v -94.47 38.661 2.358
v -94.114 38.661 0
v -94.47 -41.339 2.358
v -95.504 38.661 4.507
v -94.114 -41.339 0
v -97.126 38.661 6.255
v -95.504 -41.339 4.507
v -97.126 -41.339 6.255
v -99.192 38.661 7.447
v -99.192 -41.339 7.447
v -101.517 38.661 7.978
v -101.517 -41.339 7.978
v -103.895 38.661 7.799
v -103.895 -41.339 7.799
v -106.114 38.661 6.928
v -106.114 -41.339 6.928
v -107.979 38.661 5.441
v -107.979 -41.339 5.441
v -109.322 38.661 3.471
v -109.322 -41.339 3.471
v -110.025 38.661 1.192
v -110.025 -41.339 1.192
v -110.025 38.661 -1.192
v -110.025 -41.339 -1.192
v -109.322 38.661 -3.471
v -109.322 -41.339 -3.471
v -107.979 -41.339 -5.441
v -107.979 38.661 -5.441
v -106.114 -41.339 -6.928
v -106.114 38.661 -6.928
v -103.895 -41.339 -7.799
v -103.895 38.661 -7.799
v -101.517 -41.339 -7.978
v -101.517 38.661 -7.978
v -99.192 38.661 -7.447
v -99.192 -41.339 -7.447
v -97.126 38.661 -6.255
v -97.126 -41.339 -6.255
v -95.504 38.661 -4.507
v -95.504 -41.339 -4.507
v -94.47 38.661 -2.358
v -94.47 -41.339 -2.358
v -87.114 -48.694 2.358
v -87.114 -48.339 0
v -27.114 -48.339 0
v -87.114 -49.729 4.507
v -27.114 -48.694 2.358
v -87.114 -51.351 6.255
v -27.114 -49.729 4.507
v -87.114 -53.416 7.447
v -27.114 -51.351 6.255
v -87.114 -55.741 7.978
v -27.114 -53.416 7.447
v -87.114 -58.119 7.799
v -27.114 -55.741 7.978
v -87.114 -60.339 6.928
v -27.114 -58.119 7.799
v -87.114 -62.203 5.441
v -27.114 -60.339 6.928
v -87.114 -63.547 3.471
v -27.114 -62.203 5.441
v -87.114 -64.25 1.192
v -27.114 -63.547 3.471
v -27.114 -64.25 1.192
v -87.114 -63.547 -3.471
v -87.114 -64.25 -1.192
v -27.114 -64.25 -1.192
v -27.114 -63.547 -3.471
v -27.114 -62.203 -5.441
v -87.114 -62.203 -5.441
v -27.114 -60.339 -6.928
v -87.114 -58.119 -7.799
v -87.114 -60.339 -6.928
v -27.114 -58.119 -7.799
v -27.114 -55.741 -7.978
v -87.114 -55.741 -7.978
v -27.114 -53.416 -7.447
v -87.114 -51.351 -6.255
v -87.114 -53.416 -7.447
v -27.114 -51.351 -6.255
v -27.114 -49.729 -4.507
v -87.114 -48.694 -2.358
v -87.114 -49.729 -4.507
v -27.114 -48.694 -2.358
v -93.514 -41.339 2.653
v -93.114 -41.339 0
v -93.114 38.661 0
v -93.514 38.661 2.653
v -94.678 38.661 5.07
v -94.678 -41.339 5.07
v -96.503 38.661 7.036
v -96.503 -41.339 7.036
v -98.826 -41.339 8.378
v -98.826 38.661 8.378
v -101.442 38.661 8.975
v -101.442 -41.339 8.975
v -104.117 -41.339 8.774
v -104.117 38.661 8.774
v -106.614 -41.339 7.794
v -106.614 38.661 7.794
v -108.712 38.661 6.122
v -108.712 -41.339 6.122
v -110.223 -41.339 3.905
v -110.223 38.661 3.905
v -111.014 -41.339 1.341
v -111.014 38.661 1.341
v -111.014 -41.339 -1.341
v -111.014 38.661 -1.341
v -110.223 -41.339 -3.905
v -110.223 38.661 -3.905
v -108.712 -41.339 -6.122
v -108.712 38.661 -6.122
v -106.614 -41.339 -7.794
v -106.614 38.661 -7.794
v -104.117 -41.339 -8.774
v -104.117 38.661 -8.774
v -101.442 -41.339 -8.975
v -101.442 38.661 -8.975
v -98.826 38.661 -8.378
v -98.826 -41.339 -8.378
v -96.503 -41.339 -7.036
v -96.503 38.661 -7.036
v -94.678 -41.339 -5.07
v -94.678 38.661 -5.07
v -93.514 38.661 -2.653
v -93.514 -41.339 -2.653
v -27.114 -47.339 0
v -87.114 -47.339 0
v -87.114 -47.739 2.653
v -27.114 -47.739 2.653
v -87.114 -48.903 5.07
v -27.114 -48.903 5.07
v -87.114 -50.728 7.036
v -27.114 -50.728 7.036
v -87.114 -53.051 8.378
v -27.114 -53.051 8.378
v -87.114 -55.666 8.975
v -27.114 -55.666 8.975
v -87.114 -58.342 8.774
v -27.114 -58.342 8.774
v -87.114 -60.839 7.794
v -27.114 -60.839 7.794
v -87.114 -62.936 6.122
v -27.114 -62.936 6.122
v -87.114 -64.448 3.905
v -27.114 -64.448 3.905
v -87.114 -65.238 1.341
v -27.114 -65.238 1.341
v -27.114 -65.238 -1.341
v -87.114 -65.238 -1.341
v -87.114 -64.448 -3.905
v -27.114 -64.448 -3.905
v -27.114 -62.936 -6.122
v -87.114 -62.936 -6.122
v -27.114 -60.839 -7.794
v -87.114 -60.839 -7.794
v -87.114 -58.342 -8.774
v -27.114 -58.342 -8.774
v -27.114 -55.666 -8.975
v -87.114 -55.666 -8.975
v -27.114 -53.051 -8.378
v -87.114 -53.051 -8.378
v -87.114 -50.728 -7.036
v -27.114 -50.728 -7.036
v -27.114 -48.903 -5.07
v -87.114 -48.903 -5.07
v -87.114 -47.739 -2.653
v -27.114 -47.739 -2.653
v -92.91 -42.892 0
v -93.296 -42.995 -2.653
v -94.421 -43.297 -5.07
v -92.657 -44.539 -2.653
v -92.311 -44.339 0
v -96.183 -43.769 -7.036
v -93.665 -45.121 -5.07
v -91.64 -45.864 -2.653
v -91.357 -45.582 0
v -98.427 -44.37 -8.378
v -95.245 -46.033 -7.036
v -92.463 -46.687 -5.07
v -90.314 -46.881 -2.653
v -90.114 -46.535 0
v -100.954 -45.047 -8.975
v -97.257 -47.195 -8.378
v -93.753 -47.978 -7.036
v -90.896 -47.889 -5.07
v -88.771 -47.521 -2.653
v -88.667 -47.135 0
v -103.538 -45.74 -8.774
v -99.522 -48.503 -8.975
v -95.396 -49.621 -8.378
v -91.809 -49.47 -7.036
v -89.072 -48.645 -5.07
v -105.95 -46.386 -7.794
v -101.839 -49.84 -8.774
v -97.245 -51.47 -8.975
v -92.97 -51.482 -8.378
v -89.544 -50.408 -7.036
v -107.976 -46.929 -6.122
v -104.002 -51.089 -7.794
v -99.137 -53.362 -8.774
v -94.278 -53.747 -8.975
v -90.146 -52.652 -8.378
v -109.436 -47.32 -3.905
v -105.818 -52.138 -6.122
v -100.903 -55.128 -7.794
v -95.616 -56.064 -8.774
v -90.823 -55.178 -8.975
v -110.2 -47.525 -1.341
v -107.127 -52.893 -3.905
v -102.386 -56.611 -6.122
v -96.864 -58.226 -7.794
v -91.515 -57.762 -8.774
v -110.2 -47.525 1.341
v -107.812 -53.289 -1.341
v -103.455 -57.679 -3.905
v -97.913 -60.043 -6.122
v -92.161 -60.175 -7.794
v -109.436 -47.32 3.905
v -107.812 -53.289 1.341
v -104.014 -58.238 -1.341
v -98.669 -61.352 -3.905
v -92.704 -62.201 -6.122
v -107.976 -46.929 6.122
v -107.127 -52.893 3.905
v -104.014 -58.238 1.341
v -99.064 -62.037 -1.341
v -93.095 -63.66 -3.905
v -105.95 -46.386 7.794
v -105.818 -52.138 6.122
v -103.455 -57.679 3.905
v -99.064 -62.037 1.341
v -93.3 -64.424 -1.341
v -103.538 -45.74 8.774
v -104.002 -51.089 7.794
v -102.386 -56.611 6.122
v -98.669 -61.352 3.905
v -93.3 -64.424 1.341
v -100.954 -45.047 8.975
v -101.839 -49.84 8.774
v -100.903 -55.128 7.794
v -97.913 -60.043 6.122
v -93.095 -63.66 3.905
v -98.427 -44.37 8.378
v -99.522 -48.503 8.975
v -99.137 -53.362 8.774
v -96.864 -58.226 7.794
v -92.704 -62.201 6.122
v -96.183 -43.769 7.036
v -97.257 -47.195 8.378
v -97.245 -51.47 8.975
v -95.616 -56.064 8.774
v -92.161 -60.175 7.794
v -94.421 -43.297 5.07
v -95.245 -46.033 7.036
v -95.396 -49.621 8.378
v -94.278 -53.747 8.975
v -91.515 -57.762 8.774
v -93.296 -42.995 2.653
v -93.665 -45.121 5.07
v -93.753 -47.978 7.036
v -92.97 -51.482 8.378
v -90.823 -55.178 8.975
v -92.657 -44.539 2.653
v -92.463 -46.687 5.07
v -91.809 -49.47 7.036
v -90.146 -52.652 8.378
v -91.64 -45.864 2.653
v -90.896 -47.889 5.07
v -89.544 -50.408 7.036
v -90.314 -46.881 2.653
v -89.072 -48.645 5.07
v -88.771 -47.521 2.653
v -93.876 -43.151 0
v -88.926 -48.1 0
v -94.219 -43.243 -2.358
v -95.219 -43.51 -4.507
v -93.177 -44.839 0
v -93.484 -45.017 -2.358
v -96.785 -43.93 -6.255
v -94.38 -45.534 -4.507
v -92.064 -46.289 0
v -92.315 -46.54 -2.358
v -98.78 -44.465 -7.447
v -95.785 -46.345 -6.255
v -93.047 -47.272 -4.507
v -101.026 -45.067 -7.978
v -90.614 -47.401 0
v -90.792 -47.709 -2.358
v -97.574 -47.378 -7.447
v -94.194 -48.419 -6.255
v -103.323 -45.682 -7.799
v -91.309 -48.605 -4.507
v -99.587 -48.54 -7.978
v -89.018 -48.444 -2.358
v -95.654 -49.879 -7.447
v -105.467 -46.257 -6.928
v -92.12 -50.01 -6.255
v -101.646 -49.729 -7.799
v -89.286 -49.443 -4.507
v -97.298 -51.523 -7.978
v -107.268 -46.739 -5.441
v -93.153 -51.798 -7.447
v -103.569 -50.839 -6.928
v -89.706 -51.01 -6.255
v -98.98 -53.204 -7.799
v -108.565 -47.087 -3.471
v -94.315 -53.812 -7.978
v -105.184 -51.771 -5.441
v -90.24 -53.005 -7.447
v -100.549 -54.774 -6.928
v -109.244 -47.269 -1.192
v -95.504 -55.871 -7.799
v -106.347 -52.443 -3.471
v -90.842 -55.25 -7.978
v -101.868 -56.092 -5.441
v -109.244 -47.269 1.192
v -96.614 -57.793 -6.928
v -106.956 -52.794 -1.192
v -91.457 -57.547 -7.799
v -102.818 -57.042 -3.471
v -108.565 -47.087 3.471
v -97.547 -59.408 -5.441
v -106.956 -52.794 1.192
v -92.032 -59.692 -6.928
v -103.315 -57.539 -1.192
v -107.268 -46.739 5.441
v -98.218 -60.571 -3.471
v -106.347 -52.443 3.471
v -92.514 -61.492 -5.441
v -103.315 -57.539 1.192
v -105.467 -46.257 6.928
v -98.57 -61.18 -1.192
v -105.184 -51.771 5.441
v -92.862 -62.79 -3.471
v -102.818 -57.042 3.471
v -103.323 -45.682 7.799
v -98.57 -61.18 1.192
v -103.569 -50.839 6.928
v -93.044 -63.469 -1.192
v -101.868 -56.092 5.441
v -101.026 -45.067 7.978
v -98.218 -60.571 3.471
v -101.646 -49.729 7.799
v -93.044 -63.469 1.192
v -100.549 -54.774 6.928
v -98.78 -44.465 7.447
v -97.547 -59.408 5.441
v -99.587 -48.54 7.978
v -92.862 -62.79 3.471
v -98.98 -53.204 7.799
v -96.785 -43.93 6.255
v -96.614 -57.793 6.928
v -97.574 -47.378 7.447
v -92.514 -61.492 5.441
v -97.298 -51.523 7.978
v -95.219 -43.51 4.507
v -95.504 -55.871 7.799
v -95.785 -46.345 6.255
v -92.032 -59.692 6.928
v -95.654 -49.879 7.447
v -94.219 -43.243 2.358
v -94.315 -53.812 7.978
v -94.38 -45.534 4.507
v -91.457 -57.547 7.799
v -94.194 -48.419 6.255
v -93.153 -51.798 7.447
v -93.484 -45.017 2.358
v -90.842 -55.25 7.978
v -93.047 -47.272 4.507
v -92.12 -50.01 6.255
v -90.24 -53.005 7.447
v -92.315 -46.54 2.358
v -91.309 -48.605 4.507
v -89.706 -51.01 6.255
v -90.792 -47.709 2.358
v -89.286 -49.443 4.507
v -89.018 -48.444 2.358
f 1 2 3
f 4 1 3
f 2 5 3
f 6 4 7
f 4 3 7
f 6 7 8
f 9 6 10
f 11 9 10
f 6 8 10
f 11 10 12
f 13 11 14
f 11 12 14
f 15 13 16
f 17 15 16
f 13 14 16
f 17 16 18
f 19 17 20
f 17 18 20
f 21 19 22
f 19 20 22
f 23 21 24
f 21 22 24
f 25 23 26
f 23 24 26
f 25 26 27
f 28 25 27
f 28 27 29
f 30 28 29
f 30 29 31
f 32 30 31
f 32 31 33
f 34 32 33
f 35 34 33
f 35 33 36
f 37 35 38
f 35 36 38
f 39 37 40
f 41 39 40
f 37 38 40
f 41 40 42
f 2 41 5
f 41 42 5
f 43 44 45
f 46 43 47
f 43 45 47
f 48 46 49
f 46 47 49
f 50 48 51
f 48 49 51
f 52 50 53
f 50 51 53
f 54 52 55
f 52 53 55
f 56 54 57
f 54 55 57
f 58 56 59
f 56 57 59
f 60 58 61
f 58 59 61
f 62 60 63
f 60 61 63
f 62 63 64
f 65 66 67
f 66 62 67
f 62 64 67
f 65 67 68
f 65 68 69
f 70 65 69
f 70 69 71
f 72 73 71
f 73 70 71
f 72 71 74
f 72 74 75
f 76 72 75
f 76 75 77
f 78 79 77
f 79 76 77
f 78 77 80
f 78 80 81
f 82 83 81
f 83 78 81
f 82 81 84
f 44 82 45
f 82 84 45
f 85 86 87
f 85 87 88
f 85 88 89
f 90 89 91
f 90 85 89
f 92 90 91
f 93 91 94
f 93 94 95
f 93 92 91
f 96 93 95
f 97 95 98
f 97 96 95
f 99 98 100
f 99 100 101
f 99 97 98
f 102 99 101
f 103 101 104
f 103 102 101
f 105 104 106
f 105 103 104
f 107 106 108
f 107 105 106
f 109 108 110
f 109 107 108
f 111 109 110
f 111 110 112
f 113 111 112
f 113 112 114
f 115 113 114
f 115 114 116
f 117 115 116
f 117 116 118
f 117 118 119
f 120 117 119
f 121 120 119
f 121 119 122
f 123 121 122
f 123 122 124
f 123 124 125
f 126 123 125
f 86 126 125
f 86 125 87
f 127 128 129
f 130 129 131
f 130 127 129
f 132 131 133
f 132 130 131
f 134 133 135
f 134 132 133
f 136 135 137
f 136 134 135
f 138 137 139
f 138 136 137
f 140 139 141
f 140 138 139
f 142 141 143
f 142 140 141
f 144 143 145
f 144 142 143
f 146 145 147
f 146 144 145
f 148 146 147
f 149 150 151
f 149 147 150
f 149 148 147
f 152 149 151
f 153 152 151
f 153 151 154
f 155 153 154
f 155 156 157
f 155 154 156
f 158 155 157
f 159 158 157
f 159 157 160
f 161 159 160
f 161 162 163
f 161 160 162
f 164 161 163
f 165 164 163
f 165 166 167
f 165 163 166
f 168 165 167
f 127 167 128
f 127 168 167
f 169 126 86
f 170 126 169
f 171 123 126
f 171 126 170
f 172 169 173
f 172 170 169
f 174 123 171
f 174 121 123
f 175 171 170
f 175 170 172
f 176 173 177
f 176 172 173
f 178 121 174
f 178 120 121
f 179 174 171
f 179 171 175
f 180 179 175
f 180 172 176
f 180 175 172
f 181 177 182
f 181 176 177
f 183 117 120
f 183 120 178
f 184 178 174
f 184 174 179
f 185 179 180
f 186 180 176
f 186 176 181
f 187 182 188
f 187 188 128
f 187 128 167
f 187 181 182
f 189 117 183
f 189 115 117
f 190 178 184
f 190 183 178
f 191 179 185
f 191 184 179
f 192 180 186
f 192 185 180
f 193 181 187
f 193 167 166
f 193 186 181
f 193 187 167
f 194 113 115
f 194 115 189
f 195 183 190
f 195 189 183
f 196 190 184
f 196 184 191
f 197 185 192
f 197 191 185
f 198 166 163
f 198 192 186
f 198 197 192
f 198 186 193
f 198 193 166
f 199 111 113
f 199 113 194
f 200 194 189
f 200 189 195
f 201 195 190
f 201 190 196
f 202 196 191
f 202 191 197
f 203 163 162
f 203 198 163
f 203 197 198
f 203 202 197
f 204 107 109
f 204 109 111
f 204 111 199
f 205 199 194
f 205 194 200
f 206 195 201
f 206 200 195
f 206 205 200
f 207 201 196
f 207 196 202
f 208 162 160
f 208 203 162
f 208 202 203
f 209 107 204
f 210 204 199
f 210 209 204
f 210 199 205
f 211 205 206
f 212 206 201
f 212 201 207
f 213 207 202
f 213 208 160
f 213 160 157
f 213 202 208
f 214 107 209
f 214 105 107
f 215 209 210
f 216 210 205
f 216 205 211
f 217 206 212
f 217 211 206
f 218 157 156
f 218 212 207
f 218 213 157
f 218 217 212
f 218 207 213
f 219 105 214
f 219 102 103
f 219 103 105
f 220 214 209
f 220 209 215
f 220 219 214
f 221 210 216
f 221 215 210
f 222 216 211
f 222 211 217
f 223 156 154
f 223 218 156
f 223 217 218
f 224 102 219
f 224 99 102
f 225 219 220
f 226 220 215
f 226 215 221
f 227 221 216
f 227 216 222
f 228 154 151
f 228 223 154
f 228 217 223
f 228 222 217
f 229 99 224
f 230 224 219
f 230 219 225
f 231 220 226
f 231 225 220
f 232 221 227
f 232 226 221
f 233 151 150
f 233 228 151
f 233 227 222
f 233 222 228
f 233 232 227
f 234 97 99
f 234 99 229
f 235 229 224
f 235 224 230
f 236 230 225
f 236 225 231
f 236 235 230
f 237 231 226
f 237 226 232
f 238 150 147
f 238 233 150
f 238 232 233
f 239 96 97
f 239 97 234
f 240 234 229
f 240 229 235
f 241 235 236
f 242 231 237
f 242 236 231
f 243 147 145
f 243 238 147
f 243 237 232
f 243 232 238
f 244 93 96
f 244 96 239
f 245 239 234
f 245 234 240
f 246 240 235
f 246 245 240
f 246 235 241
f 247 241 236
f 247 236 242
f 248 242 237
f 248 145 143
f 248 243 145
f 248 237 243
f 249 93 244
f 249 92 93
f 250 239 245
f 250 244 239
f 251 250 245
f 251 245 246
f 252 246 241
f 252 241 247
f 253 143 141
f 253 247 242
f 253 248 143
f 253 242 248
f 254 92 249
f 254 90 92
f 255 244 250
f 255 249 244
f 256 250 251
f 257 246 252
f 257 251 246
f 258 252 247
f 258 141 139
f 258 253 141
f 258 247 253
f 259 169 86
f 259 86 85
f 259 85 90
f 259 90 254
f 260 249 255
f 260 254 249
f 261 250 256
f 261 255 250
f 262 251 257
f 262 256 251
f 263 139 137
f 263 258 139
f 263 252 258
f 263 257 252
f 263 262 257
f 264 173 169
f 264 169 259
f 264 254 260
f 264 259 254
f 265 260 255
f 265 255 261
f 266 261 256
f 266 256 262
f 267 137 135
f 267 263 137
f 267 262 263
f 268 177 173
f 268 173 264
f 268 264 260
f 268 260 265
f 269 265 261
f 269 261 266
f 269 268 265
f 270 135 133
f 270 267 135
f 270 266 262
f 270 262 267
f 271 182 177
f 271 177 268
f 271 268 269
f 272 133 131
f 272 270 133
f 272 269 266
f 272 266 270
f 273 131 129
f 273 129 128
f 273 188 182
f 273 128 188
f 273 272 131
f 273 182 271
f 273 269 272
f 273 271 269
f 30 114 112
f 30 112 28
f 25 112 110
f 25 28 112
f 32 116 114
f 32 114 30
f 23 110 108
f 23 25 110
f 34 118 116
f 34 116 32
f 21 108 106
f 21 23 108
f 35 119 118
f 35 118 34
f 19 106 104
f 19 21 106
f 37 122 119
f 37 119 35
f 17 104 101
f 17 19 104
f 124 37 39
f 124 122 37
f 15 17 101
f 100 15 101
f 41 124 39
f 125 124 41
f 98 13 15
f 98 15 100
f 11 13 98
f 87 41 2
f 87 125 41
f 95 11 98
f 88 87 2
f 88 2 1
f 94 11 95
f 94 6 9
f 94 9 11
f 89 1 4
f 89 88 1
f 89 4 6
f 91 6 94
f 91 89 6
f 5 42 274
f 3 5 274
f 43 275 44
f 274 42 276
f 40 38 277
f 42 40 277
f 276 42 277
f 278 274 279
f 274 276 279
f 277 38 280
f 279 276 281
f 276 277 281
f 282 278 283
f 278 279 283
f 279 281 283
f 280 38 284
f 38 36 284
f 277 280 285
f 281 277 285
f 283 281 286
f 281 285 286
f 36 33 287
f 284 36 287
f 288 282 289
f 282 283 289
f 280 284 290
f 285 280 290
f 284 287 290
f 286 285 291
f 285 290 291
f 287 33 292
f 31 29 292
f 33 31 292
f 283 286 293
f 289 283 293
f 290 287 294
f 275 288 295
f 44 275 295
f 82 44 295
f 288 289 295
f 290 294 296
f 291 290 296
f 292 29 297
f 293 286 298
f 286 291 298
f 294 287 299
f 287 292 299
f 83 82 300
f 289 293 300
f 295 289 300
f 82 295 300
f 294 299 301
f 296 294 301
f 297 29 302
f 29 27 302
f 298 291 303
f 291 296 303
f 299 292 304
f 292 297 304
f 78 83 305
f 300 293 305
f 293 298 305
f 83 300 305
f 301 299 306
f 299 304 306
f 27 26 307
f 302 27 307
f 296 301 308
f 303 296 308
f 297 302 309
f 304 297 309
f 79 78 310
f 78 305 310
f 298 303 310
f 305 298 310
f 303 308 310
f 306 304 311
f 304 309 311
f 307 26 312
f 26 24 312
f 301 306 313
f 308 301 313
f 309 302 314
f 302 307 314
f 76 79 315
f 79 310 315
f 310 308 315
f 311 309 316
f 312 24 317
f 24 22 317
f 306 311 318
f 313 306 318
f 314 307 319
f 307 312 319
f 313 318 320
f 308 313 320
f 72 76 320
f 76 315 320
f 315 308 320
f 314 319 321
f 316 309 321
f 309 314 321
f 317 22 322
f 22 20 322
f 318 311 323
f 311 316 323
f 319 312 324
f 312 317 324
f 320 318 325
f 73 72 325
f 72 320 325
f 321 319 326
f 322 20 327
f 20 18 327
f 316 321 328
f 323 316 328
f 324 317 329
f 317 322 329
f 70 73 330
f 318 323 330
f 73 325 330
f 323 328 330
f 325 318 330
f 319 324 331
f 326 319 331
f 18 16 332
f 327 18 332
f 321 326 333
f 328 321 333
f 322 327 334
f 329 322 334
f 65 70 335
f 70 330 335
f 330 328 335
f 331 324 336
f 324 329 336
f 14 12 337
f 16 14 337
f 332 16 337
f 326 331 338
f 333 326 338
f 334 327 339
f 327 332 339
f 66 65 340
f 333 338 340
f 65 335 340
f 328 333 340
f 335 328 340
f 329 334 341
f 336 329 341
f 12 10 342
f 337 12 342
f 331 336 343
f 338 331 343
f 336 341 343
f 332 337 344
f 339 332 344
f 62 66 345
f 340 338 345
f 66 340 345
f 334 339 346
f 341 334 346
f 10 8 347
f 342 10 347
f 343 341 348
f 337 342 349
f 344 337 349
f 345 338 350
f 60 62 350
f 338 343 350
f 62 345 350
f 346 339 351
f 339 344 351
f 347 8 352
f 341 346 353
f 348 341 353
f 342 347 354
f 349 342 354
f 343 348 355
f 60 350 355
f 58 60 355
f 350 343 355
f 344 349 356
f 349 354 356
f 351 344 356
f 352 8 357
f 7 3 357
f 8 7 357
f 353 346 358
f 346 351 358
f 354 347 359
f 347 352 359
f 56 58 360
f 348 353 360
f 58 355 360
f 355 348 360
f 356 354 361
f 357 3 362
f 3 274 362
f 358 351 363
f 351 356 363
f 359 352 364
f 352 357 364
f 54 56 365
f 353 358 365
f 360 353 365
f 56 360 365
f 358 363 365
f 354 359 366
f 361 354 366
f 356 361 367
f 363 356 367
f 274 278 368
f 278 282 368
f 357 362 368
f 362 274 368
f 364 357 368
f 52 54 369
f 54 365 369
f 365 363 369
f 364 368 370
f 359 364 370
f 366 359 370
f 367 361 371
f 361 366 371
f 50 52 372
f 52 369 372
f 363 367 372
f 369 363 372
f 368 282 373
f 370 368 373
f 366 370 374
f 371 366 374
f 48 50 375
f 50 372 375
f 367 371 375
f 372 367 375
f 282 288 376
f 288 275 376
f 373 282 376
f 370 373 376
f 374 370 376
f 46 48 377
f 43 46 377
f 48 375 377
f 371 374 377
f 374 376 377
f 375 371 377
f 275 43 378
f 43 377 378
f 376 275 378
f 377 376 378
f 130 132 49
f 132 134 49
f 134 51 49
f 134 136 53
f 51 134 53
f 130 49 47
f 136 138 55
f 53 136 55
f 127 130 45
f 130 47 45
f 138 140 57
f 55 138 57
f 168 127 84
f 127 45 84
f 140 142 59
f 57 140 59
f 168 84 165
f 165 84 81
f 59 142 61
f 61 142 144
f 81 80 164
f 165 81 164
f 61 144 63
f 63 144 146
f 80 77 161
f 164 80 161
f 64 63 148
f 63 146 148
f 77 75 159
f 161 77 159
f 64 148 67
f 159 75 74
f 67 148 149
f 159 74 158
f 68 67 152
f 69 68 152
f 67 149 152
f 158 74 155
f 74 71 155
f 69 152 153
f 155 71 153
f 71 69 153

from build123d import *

# Parameters (mm, degrees)
SKETCH2_R = 9
SHELL1_T  = -1


with BuildPart() as part:
    # Sweep1: sweep along a path in Sketch1
    with BuildLine(Plane.XY) as sweep1_path:
        Line((-102.114386638, 38.661028062), (-102.114386638, -41.338971938))
        ThreePointArc((-102.114386638, -41.338971938), (-97.720988356, -51.945573656), (-87.114386638, -56.338971938))
        Line((-87.114386638, -56.338971938), (-27.114386638, -56.338971938))
    # Sketch2 → Sweep1 (sweep)
    with BuildSketch(Plane(origin=(0, 38.661028062, 0), x_dir=(1, 0, 0), z_dir=(0, 1, 0))):
        with Locations((-102.114386638, 0)):
            Circle(SKETCH2_R)
    sweep(path=sweep1_path.line)

    # Shell1
    shell1_openings = [part.faces().sort_by_distance(p)[0] for p in [
        (-27.114386638, -56.338971938, 0),
        (-102.114386638, 38.661028062, 0),
    ]]
    offset(amount=SHELL1_T, openings=shell1_openings, kind=Kind.INTERSECTION)


solid = part.part
